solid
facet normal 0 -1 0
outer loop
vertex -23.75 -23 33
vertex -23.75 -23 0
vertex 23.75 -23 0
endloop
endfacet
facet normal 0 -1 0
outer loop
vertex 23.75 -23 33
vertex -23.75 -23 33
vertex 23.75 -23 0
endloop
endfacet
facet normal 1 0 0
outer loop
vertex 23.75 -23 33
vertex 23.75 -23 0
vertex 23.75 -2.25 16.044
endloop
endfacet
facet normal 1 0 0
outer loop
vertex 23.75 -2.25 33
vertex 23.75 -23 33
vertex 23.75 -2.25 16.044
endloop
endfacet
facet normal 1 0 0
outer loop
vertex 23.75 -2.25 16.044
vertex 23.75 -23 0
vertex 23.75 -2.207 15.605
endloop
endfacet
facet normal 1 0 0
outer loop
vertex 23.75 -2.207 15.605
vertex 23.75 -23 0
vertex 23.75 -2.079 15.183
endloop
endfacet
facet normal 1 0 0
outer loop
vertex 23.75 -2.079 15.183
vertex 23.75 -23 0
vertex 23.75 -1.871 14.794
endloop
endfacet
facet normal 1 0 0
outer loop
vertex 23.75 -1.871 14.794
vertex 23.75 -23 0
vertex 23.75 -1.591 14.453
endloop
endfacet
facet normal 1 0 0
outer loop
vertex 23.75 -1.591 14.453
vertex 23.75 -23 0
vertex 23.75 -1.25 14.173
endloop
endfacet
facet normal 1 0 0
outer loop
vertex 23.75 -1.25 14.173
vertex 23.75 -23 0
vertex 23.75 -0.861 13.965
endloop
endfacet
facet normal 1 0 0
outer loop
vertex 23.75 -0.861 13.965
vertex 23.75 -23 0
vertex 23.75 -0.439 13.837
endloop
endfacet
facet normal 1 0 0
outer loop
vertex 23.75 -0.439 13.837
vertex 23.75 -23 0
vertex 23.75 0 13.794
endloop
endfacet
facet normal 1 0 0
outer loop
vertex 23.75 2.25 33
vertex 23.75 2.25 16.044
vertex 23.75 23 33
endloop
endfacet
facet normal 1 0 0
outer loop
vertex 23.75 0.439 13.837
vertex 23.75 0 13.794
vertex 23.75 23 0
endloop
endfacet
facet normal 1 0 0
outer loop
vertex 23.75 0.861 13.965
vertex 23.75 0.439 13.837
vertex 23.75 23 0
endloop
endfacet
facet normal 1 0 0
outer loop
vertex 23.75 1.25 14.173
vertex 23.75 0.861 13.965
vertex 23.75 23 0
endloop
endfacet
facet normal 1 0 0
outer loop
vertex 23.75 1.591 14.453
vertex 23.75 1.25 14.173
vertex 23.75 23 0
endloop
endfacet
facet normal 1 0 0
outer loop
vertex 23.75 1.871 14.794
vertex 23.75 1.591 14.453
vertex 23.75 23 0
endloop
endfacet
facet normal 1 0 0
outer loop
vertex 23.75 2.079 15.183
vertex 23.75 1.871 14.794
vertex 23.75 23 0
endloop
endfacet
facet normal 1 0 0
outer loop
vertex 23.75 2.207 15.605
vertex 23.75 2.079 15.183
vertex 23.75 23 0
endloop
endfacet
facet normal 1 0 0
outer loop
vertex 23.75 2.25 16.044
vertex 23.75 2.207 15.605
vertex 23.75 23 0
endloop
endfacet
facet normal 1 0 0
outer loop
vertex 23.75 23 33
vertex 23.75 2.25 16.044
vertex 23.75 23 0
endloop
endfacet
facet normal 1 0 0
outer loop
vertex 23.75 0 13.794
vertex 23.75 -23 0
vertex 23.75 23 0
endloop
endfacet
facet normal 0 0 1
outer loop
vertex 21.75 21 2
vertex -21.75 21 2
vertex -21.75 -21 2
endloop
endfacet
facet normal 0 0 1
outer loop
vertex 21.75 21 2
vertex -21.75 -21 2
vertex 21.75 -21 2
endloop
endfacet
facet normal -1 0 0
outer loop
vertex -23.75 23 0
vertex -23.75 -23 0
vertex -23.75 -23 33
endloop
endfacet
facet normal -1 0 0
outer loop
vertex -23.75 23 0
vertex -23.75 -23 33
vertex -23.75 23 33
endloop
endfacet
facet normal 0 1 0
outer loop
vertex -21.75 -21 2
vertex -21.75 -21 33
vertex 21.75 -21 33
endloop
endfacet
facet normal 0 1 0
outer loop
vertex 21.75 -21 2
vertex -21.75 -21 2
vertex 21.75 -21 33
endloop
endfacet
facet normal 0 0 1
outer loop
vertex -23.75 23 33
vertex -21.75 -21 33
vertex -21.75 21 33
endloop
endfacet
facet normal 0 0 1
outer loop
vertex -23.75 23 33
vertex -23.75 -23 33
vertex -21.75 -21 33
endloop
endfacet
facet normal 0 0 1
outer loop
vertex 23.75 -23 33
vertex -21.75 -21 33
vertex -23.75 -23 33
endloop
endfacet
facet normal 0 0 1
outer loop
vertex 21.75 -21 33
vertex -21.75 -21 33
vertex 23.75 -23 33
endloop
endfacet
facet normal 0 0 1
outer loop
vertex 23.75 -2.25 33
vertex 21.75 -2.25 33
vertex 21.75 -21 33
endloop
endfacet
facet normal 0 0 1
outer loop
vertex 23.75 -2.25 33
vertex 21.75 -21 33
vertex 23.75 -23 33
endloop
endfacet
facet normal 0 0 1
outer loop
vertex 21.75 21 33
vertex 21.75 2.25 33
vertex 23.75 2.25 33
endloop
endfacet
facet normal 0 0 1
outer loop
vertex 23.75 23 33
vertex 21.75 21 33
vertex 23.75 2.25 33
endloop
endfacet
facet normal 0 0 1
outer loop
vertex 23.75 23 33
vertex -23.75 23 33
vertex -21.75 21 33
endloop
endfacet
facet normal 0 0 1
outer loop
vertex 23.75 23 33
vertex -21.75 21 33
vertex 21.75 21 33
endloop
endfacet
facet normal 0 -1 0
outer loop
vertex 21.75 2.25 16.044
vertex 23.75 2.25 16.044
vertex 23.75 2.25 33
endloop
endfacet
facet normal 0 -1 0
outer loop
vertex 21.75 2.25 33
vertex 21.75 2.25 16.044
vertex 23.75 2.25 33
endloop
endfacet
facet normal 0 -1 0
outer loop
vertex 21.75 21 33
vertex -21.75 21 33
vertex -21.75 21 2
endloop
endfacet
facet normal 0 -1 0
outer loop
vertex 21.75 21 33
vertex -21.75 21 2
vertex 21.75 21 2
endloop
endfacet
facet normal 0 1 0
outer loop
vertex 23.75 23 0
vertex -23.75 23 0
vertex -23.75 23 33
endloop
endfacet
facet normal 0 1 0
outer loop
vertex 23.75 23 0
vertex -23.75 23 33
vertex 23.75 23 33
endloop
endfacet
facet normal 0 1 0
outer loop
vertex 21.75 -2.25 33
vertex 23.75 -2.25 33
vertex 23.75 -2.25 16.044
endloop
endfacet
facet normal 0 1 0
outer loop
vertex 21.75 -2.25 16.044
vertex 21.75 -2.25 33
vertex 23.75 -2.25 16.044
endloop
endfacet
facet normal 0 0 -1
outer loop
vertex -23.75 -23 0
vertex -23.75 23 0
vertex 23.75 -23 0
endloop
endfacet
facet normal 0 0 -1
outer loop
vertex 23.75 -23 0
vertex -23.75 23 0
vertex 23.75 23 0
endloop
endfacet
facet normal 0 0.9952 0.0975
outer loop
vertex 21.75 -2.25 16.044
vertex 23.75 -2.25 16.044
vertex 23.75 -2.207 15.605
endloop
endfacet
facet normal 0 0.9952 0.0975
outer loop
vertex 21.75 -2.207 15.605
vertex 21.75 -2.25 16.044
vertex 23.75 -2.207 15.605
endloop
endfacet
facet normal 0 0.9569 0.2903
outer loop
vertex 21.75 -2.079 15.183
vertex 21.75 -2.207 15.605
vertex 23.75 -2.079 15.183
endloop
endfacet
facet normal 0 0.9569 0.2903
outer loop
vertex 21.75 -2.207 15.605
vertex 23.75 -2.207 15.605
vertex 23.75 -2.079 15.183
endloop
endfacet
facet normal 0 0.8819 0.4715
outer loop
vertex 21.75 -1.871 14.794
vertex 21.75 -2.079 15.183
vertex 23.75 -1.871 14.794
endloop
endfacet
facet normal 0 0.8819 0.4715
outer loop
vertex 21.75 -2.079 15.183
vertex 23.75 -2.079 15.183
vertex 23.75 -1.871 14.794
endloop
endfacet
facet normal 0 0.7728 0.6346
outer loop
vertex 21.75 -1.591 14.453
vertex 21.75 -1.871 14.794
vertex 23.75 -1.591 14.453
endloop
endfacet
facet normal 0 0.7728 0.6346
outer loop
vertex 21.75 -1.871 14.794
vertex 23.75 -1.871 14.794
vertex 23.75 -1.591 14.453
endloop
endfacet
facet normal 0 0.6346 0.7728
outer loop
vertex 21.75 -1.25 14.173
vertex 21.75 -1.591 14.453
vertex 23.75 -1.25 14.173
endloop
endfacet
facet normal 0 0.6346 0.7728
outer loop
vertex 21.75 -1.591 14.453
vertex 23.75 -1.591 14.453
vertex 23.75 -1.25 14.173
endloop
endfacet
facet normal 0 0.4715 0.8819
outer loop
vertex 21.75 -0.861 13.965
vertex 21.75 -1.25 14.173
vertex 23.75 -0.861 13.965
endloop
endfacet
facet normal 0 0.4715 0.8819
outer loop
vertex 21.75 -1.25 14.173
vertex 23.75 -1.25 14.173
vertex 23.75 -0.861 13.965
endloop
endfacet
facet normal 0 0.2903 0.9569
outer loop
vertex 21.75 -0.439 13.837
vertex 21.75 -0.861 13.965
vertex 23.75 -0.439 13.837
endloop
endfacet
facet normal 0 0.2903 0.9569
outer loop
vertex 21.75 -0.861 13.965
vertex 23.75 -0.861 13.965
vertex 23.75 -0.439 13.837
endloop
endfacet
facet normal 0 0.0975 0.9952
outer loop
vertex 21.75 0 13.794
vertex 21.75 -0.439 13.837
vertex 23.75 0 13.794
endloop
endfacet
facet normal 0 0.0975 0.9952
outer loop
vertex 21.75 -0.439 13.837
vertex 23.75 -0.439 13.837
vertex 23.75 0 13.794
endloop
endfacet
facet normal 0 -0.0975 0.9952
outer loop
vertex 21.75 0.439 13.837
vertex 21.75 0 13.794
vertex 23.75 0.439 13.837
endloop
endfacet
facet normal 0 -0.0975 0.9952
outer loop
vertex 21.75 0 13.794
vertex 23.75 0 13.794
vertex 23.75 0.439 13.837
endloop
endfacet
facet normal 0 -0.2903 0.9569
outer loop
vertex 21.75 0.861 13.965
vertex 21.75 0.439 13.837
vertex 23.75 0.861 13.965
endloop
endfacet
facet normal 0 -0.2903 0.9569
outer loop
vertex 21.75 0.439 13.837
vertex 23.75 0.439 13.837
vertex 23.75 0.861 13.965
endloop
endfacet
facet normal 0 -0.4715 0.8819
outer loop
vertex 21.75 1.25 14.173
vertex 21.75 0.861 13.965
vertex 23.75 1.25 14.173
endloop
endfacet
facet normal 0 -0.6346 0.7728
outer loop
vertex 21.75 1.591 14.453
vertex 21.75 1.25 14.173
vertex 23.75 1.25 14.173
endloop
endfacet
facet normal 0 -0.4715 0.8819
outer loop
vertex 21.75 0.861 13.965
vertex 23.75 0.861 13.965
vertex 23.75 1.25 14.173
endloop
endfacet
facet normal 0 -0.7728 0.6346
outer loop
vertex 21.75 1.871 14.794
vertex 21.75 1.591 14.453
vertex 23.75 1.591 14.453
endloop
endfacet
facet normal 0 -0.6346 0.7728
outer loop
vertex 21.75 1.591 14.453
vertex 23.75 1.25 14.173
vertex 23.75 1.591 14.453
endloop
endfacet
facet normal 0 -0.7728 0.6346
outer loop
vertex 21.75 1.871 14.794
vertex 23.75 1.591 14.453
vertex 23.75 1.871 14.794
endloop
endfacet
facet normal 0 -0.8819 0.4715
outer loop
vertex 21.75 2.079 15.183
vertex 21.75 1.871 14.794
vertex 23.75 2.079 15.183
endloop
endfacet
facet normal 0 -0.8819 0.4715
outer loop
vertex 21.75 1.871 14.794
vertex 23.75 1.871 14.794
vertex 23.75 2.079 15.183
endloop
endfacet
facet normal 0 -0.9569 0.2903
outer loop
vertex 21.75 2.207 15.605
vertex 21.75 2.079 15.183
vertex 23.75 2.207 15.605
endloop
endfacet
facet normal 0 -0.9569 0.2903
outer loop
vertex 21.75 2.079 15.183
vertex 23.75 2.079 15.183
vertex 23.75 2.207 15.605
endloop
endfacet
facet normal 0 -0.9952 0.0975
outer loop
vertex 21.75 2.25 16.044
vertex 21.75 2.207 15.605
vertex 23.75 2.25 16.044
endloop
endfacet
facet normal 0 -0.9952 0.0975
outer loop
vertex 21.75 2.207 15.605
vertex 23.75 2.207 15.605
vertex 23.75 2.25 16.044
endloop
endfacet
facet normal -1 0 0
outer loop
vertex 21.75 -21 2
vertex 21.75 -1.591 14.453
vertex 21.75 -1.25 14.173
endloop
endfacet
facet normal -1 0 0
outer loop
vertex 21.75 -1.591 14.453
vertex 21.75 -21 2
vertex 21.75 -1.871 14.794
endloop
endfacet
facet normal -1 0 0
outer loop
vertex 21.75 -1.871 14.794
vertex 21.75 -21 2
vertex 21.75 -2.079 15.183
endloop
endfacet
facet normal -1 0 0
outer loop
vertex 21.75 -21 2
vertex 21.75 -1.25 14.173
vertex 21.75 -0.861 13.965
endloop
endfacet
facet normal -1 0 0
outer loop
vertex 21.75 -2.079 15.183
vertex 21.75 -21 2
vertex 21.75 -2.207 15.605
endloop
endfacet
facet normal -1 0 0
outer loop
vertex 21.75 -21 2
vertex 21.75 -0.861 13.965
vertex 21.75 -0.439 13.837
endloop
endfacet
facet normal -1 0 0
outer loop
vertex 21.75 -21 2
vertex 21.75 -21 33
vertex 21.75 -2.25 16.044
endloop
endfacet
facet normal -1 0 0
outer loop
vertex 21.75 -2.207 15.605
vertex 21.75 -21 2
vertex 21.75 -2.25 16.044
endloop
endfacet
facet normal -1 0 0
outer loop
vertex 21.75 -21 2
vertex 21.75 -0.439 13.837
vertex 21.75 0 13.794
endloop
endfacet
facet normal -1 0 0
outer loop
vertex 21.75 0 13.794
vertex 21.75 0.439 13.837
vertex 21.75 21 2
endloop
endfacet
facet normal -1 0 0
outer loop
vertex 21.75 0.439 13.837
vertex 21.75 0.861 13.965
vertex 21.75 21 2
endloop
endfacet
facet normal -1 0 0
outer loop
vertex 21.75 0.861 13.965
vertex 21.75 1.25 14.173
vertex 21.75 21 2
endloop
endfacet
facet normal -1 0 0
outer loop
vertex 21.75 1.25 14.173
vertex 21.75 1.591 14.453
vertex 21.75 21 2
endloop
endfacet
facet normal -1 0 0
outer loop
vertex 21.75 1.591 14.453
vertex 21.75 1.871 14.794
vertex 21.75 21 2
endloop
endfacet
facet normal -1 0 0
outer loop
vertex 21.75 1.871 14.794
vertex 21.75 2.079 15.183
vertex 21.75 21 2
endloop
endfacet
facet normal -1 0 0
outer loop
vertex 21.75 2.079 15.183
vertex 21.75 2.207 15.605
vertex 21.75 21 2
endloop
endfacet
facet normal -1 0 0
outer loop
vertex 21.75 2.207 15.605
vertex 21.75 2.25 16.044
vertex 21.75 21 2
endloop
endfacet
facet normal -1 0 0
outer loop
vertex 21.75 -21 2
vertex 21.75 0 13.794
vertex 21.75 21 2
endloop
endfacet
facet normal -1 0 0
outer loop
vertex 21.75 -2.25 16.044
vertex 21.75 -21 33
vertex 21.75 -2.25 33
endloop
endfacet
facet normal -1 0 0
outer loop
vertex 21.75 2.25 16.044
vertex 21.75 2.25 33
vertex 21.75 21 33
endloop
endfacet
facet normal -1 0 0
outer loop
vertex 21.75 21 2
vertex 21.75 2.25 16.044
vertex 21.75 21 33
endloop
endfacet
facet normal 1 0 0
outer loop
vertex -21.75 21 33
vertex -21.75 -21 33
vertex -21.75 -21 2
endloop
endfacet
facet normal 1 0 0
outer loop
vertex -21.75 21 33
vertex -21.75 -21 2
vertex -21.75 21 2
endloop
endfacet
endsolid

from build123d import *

# Parameters (mm, degrees)
F0_W     = 47.5
F0_H     = 46
F1_DEPTH = 33
F2_W     = 43.5
F2_H     = 42
F3_DEPTH = 31
F5_DEPTH = 5


with BuildPart() as f1:
    # F0 (on Top) → F1 (new body)
    with BuildSketch(Plane.XY):
        Rectangle(F0_W, F0_H)
    extrude(amount=F1_DEPTH)

    # F2 (on face) → F3 (cut)
    with BuildSketch(Plane.XY.offset(33)):
        Rectangle(F2_W, F2_H)
    extrude(amount=-F3_DEPTH, mode=Mode.SUBTRACT)

    # F4 (on face) → F5 (cut)
    with BuildSketch(Plane.YZ.offset(23.75)):
        with BuildLine():
            ThreePointArc((-2.25, 16.043559), (0, 18.293559), (2.25, 16.043559))
            Line((2.25, 16.043559), (2.25, 33))
            Line((2.25, 33), (-2.25, 33))
            Line((-2.25, 33), (-2.25, 16.043559))
        make_face()
        with BuildLine():
            ThreePointArc((-2.25, 16.043559), (0, 13.793559), (2.25, 16.043559))
            ThreePointArc((2.25, 16.043559), (0, 18.293559), (-2.25, 16.043559))
        make_face()
    extrude(amount=-F5_DEPTH, mode=Mode.SUBTRACT)


solid = f1.part
